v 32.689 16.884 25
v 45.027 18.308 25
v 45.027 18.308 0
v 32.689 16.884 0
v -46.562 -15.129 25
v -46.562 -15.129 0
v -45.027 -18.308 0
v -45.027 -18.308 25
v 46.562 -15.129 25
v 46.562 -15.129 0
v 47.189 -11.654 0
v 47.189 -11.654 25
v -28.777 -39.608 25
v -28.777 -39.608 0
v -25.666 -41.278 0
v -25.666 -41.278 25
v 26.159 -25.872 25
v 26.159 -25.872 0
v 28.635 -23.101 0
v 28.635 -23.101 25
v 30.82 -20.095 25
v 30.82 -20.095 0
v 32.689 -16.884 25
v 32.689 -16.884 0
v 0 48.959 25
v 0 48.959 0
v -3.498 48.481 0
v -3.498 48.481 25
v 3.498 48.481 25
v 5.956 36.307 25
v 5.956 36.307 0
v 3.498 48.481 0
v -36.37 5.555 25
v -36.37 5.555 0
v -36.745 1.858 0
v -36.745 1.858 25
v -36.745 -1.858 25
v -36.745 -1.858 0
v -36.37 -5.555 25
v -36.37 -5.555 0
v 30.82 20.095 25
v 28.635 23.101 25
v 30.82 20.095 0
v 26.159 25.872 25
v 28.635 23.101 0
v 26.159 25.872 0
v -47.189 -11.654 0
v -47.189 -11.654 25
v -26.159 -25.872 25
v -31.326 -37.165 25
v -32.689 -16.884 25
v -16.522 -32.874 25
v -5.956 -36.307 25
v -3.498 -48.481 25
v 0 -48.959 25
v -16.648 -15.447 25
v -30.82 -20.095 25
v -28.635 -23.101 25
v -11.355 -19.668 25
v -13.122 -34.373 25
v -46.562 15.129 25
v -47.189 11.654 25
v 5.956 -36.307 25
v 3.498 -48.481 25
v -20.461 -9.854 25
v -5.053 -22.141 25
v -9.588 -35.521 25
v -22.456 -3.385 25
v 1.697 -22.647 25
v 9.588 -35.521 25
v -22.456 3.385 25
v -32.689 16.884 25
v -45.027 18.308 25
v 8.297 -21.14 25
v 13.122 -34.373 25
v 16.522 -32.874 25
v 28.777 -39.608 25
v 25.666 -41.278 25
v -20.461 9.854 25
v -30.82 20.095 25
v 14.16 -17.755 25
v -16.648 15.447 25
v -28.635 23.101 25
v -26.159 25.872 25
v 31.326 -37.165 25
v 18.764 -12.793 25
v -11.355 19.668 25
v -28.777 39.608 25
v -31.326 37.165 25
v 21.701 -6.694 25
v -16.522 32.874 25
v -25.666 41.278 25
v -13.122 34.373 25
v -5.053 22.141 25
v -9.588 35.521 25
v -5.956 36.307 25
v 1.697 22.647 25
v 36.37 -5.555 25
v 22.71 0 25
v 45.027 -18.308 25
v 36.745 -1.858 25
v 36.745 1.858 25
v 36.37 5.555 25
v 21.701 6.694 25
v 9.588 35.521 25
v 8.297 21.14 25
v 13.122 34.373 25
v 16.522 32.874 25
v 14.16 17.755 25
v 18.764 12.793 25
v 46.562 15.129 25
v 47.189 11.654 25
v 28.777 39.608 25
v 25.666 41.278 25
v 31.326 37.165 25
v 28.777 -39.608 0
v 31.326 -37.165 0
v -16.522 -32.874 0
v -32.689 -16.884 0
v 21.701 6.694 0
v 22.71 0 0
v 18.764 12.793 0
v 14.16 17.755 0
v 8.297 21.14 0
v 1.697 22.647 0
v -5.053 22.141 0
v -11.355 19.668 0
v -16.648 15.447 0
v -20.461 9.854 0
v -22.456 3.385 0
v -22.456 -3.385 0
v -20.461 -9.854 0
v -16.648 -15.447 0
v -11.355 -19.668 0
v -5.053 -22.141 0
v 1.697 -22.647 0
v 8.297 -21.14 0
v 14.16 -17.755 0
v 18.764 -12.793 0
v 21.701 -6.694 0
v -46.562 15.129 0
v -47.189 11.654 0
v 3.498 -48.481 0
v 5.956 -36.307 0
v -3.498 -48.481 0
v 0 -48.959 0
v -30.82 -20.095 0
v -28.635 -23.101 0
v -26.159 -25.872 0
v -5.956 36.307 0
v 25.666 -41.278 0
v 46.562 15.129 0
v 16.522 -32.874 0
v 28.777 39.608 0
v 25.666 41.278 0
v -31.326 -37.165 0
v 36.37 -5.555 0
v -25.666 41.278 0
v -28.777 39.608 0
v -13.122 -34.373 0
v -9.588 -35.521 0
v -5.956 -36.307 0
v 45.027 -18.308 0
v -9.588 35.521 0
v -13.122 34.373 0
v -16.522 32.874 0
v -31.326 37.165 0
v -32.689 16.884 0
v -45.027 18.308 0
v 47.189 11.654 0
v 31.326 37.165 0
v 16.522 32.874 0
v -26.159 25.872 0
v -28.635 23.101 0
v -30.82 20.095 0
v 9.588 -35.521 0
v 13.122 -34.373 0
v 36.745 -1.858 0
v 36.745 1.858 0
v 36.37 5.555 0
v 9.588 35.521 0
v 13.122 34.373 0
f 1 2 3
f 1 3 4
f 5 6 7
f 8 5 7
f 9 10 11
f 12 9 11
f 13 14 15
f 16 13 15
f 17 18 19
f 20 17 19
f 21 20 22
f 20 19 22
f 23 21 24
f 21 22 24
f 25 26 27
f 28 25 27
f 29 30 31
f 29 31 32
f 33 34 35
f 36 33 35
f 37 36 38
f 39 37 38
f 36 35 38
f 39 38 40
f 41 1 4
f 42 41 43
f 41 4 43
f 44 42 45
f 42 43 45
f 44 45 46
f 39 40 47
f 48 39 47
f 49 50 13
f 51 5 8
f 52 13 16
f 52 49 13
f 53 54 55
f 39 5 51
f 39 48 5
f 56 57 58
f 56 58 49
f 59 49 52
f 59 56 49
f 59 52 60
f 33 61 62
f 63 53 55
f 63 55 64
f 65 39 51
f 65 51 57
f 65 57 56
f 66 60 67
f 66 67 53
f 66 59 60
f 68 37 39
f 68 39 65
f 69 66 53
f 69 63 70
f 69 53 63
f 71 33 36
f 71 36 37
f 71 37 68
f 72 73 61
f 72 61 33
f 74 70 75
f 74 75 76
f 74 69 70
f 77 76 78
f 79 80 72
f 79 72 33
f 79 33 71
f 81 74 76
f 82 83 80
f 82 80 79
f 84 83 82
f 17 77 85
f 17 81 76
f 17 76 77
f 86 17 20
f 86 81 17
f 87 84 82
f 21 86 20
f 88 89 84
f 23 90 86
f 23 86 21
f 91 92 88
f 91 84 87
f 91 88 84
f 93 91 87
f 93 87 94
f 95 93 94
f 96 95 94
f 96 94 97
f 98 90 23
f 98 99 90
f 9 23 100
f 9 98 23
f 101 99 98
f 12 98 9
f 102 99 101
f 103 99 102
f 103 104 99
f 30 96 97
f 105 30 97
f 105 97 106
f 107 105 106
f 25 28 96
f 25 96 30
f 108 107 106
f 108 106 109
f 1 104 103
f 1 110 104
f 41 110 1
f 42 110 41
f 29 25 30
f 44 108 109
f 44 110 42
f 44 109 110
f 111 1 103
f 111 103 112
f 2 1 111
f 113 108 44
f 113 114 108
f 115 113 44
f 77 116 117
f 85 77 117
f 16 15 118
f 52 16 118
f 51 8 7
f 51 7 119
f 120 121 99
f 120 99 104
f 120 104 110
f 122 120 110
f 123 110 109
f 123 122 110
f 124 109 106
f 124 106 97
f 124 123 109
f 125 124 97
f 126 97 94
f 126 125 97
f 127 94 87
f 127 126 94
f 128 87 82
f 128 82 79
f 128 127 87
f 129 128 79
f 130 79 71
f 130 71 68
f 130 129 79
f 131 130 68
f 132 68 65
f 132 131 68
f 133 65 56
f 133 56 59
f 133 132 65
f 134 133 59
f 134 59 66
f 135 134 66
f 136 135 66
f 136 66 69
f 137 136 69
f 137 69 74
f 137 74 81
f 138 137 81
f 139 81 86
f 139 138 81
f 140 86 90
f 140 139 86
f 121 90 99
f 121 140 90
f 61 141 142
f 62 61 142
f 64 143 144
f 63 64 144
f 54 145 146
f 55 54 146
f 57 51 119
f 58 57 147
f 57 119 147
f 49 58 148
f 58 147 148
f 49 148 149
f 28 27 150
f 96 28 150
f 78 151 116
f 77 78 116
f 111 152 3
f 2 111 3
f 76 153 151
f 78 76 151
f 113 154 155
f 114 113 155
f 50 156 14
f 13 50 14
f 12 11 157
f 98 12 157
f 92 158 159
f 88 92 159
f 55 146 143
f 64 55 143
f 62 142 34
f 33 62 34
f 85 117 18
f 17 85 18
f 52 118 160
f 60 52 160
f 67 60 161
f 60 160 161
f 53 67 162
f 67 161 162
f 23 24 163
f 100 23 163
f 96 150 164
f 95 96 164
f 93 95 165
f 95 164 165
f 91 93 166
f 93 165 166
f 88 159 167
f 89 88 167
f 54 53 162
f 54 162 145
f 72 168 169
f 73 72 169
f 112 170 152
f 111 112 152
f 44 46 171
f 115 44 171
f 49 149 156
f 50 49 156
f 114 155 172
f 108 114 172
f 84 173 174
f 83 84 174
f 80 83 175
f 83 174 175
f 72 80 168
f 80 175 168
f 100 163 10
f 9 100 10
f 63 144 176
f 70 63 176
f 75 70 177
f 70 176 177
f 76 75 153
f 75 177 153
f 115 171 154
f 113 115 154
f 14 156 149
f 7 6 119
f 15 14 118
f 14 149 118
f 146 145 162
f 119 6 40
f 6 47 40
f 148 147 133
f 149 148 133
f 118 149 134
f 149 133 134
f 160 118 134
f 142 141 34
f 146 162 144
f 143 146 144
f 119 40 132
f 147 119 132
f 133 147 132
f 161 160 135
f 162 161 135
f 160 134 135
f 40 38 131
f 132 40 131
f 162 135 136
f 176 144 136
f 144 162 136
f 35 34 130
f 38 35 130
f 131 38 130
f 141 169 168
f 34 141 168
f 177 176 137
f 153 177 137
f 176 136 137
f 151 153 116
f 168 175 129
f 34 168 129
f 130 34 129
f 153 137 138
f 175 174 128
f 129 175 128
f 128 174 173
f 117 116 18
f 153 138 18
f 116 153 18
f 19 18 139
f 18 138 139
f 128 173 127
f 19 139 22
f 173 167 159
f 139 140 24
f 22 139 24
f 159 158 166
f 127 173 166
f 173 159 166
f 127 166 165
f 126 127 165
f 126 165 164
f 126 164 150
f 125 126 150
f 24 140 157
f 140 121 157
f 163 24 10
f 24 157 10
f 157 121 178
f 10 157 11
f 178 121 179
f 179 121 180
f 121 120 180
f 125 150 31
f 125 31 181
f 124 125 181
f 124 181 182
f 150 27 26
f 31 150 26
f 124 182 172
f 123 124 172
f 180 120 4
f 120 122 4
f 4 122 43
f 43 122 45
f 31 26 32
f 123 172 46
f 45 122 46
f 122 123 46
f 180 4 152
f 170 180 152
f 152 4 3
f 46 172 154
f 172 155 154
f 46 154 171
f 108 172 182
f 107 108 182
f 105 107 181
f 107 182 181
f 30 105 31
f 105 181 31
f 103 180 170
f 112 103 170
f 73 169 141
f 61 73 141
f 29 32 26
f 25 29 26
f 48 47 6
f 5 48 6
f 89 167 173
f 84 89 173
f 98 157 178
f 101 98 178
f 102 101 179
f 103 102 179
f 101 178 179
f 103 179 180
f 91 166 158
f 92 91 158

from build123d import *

# Parameters (mm, degrees)
F1_R     = 22.710134
F2_DEPTH = 25


with BuildPart() as f2:
    # F1 (on Top) → F2 (new body)
    with BuildSketch(Plane.XY):
        with BuildLine():
            Line((3.498161, 48.480518), (0, 48.958581))
            Line((0, 48.958581), (-3.498161, 48.480518))
            Line((-3.498161, 48.480518), (-5.9562, 36.306892))
            ThreePointArc((-5.9562, 36.306892), (-11.369418, 34.991471), (-16.521988, 32.873859))
            Line((-16.521988, 32.873859), (-25.666062, 41.277731))
            Line((-25.666062, 41.277731), (-28.777132, 39.608324))
            Line((-28.777132, 39.608324), (-31.326205, 37.165396))
            Line((-31.326205, 37.165396), (-26.159323, 25.871926))
            ThreePointArc((-26.159323, 25.871926), (-29.765523, 21.625918), (-32.689339, 16.88413))
            Line((-32.689339, 16.88413), (-45.026722, 18.308253))
            Line((-45.026722, 18.308253), (-46.562377, 15.129034))
            Line((-46.562377, 15.129034), (-47.188704, 11.654355))
            Line((-47.188704, 11.654355), (-36.370473, 5.554763))
            ThreePointArc((-36.370473, 5.554763), (-36.79221, 0), (-36.370473, -5.554763))
            Line((-36.370473, -5.554763), (-47.188704, -11.654355))
            Line((-47.188704, -11.654355), (-46.562377, -15.129034))
            Line((-46.562377, -15.129034), (-45.026722, -18.308253))
            Line((-45.026722, -18.308253), (-32.689339, -16.88413))
            ThreePointArc((-32.689339, -16.88413), (-29.765523, -21.625918), (-26.159323, -25.871926))
            Line((-26.159323, -25.871926), (-31.326205, -37.165396))
            Line((-31.326205, -37.165396), (-28.777132, -39.608324))
            Line((-28.777132, -39.608324), (-25.666062, -41.277731))
            Line((-25.666062, -41.277731), (-16.521988, -32.873859))
            ThreePointArc((-16.521988, -32.873859), (-11.369418, -34.991471), (-5.9562, -36.306892))
            Line((-5.9562, -36.306892), (-3.498161, -48.480518))
            Line((-3.498161, -48.480518), (0, -48.958581))
            Line((0, -48.958581), (3.498161, -48.480518))
            Line((3.498161, -48.480518), (5.9562, -36.306892))
            ThreePointArc((5.9562, -36.306892), (11.369418, -34.991471), (16.521988, -32.873859))
            Line((16.521988, -32.873859), (25.666062, -41.277731))
            Line((25.666062, -41.277731), (28.777132, -39.608324))
            Line((28.777132, -39.608324), (31.326205, -37.165396))
            Line((31.326205, -37.165396), (26.159323, -25.871926))
            ThreePointArc((26.159323, -25.871926), (29.765523, -21.625918), (32.689339, -16.88413))
            Line((32.689339, -16.88413), (45.026722, -18.308253))
            Line((45.026722, -18.308253), (46.562377, -15.129034))
            Line((46.562377, -15.129034), (47.188704, -11.654355))
            Line((47.188704, -11.654355), (36.370473, -5.554763))
            ThreePointArc((36.370473, -5.554763), (36.79221, 0), (36.370473, 5.554763))
            Line((36.370473, 5.554763), (47.188704, 11.654355))
            Line((47.188704, 11.654355), (46.562377, 15.129034))
            Line((46.562377, 15.129034), (45.026722, 18.308253))
            Line((45.026722, 18.308253), (32.689339, 16.88413))
            ThreePointArc((32.689339, 16.88413), (29.765523, 21.625918), (26.159323, 25.871926))
            Line((26.159323, 25.871926), (31.326205, 37.165396))
            Line((31.326205, 37.165396), (28.777132, 39.608324))
            Line((28.777132, 39.608324), (25.666062, 41.277731))
            Line((25.666062, 41.277731), (16.521988, 32.873859))
            ThreePointArc((16.521988, 32.873859), (11.369418, 34.991471), (5.9562, 36.306892))
            Line((5.9562, 36.306892), (3.498161, 48.480518))
        make_face()
        Circle(F1_R, mode=Mode.SUBTRACT)
    extrude(amount=F2_DEPTH)


solid = f2.part
